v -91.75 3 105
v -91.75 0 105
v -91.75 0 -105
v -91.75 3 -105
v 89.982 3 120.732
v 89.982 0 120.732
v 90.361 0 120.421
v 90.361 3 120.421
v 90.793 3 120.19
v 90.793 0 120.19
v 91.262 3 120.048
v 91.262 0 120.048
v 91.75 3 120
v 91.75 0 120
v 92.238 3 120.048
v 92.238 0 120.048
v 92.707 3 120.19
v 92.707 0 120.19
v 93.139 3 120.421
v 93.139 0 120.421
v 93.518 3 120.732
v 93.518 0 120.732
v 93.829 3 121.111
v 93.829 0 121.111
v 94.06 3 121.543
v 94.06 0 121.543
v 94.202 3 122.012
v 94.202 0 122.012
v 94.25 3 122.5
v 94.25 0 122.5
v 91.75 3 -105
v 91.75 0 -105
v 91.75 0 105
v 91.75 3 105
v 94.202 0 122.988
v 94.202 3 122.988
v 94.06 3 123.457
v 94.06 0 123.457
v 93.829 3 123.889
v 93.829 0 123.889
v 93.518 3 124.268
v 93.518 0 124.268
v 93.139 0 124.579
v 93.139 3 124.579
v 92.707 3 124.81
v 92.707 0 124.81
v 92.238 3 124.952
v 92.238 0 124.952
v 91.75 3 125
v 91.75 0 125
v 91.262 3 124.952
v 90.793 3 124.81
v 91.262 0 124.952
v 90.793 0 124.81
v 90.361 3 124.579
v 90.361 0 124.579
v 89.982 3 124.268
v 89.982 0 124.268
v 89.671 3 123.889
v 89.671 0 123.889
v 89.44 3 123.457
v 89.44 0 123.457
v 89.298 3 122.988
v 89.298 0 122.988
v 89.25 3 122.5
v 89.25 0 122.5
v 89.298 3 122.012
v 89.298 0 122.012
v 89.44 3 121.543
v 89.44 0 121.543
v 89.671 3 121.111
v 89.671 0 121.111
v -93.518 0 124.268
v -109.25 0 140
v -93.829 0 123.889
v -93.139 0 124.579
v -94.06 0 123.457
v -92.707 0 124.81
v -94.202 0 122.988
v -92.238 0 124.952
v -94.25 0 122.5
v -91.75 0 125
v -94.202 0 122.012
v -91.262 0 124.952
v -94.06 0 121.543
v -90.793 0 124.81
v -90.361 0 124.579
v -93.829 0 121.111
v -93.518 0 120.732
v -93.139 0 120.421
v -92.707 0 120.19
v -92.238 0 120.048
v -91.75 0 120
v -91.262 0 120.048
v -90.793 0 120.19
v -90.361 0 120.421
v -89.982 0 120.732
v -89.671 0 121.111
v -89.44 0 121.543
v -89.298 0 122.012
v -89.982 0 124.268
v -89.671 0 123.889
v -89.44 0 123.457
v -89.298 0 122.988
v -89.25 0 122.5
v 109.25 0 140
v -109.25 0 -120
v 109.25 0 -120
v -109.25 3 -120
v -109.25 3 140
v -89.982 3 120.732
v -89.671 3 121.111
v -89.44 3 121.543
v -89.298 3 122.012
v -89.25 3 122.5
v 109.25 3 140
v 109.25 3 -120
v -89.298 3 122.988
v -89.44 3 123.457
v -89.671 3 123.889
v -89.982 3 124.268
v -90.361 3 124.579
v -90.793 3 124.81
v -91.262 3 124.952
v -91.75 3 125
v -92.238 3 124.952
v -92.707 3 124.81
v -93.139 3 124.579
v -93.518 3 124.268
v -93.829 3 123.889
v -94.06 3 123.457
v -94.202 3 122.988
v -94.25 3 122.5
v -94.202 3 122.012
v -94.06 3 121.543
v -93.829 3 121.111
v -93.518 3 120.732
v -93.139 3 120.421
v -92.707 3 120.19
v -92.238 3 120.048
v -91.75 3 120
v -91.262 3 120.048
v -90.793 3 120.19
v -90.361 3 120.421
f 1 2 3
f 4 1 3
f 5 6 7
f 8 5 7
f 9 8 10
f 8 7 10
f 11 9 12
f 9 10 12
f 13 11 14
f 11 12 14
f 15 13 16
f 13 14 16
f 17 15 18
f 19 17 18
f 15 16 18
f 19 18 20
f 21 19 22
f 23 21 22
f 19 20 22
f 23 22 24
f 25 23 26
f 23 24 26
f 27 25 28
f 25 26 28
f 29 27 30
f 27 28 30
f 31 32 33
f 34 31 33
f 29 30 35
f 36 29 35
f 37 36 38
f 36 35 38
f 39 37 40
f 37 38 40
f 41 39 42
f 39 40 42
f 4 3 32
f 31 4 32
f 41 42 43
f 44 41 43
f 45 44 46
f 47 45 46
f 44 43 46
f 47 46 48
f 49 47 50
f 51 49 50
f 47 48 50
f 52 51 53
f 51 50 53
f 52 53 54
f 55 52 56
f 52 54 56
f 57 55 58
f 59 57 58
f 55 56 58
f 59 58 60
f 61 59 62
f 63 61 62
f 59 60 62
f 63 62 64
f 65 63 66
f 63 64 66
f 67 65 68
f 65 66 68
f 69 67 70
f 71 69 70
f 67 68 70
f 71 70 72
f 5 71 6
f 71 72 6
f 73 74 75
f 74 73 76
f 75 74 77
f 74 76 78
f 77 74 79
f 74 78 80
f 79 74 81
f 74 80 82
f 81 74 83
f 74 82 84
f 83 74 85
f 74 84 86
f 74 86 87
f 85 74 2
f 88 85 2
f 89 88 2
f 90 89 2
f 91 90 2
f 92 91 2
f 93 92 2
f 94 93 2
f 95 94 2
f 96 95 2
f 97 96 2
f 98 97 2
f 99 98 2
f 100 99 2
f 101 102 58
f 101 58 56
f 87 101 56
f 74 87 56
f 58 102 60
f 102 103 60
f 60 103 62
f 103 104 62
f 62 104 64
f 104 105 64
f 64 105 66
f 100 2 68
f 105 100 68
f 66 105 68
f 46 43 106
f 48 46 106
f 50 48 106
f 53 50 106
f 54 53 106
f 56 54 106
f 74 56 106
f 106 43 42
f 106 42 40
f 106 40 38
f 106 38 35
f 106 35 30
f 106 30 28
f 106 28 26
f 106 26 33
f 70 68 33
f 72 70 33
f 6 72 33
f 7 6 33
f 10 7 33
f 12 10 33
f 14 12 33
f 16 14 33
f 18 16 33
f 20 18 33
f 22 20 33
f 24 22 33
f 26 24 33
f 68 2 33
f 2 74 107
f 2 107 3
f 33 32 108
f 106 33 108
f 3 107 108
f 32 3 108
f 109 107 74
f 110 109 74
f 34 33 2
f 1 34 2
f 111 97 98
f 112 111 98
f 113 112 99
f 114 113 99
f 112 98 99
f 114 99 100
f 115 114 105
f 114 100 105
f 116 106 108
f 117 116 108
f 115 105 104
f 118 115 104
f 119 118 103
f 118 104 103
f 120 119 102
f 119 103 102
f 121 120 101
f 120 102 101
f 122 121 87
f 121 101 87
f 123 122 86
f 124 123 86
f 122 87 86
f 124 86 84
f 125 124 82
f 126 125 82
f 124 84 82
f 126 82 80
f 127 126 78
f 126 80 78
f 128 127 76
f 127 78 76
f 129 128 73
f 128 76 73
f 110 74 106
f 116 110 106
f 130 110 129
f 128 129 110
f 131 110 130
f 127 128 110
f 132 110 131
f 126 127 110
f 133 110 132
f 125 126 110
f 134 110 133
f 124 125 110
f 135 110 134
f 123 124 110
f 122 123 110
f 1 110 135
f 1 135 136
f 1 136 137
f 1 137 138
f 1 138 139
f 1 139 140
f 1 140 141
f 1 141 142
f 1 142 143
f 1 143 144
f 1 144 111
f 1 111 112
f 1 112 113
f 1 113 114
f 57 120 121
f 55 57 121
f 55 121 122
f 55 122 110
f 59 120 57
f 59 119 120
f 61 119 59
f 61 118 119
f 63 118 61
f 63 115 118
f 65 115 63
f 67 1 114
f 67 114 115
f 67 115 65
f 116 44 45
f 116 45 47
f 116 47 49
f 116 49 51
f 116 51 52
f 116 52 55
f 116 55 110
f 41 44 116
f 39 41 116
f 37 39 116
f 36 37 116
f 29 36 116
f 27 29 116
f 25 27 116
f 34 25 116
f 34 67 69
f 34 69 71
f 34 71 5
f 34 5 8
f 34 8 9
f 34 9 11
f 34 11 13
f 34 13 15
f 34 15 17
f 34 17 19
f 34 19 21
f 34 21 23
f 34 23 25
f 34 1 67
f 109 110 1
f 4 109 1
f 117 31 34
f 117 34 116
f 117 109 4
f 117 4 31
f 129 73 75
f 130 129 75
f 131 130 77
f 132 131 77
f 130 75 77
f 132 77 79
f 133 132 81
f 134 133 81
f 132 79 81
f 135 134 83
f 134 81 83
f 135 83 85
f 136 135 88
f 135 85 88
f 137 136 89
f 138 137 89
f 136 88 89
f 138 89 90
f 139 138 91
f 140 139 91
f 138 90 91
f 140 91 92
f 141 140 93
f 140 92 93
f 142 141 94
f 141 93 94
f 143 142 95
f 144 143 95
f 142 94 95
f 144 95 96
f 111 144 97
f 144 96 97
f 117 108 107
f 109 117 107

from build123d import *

# Parameters (mm, degrees)
SKETCH1_W           = 148.5
SKETCH1_H           = 35
BOSS_EXTRUDE1_DEPTH = 3


with BuildPart() as part:
    # Sketch1 → Boss-Extrude1 (new body)
    with BuildSketch(Plane(origin=(0, 0, 0), x_dir=(1, 0, 0), z_dir=(0, 1, 0))):
        Polygon((0, 105), (0, 120), (-91.75, 120), (-91.75, 105), (-74.25, 105), align=None)
        Polygon((91.75, 105), (91.75, 120), (0, 120), (0, 105), (74.25, 105), align=None)
        Polygon((109.25, -105), (109.25, 120), (91.75, 120), (91.75, 105), (91.75, -105), align=None)
        Polygon((-91.75, 105), (-91.75, 120), (-109.25, 120), (-109.25, -105), (-91.75, -105), align=None)
        with BuildLine():
            Line((-109.25, -140), (-74.25, -140))
            Line((-74.25, -140), (-74.25, -105))
            Line((-74.25, -105), (-89.982233047, -120.732233047))
            ThreePointArc((-89.982233047, -120.732233047), (-89.440301169, -121.543291419), (-89.25, -122.5))
            ThreePointArc((-89.25, -122.5), (-90.793291419, -124.809698831), (-93.517766953, -124.267766953))
            Line((-93.517766953, -124.267766953), (-109.25, -140))
        make_face()
        with BuildLine():
            Line((-89.982233047, -120.732233047), (-74.25, -105))
            Line((-74.25, -105), (-91.75, -105))
            Line((-91.75, -105), (-109.25, -105))
            Line((-109.25, -105), (-109.25, -140))
            Line((-109.25, -140), (-93.517766953, -124.267766953))
            ThreePointArc((-93.517766953, -124.267766953), (-93.517766953, -120.732233047), (-89.982233047, -120.732233047))
        make_face()
        with Locations((0, -122.5)):
            Rectangle(SKETCH1_W, SKETCH1_H)
        with BuildLine():
            Line((74.25, -140), (109.25, -140))
            Line((109.25, -140), (93.517766953, -124.267766953))
            ThreePointArc((93.517766953, -124.267766953), (89.982233047, -124.267766953), (89.982233047, -120.732233047))
            Line((89.982233047, -120.732233047), (74.25, -105))
            Line((74.25, -105), (74.25, -140))
        make_face()
        with BuildLine():
            Line((109.25, -140), (109.25, -105))
            Line((109.25, -105), (91.75, -105))
            Line((91.75, -105), (74.25, -105))
            Line((74.25, -105), (89.982233047, -120.732233047))
            ThreePointArc((89.982233047, -120.732233047), (92.706708581, -120.190301169), (94.25, -122.5))
            ThreePointArc((94.25, -122.5), (94.059698831, -123.456708581), (93.517766953, -124.267766953))
            Line((93.517766953, -124.267766953), (109.25, -140))
        make_face()
    extrude(amount=BOSS_EXTRUDE1_DEPTH)


solid = part.part
